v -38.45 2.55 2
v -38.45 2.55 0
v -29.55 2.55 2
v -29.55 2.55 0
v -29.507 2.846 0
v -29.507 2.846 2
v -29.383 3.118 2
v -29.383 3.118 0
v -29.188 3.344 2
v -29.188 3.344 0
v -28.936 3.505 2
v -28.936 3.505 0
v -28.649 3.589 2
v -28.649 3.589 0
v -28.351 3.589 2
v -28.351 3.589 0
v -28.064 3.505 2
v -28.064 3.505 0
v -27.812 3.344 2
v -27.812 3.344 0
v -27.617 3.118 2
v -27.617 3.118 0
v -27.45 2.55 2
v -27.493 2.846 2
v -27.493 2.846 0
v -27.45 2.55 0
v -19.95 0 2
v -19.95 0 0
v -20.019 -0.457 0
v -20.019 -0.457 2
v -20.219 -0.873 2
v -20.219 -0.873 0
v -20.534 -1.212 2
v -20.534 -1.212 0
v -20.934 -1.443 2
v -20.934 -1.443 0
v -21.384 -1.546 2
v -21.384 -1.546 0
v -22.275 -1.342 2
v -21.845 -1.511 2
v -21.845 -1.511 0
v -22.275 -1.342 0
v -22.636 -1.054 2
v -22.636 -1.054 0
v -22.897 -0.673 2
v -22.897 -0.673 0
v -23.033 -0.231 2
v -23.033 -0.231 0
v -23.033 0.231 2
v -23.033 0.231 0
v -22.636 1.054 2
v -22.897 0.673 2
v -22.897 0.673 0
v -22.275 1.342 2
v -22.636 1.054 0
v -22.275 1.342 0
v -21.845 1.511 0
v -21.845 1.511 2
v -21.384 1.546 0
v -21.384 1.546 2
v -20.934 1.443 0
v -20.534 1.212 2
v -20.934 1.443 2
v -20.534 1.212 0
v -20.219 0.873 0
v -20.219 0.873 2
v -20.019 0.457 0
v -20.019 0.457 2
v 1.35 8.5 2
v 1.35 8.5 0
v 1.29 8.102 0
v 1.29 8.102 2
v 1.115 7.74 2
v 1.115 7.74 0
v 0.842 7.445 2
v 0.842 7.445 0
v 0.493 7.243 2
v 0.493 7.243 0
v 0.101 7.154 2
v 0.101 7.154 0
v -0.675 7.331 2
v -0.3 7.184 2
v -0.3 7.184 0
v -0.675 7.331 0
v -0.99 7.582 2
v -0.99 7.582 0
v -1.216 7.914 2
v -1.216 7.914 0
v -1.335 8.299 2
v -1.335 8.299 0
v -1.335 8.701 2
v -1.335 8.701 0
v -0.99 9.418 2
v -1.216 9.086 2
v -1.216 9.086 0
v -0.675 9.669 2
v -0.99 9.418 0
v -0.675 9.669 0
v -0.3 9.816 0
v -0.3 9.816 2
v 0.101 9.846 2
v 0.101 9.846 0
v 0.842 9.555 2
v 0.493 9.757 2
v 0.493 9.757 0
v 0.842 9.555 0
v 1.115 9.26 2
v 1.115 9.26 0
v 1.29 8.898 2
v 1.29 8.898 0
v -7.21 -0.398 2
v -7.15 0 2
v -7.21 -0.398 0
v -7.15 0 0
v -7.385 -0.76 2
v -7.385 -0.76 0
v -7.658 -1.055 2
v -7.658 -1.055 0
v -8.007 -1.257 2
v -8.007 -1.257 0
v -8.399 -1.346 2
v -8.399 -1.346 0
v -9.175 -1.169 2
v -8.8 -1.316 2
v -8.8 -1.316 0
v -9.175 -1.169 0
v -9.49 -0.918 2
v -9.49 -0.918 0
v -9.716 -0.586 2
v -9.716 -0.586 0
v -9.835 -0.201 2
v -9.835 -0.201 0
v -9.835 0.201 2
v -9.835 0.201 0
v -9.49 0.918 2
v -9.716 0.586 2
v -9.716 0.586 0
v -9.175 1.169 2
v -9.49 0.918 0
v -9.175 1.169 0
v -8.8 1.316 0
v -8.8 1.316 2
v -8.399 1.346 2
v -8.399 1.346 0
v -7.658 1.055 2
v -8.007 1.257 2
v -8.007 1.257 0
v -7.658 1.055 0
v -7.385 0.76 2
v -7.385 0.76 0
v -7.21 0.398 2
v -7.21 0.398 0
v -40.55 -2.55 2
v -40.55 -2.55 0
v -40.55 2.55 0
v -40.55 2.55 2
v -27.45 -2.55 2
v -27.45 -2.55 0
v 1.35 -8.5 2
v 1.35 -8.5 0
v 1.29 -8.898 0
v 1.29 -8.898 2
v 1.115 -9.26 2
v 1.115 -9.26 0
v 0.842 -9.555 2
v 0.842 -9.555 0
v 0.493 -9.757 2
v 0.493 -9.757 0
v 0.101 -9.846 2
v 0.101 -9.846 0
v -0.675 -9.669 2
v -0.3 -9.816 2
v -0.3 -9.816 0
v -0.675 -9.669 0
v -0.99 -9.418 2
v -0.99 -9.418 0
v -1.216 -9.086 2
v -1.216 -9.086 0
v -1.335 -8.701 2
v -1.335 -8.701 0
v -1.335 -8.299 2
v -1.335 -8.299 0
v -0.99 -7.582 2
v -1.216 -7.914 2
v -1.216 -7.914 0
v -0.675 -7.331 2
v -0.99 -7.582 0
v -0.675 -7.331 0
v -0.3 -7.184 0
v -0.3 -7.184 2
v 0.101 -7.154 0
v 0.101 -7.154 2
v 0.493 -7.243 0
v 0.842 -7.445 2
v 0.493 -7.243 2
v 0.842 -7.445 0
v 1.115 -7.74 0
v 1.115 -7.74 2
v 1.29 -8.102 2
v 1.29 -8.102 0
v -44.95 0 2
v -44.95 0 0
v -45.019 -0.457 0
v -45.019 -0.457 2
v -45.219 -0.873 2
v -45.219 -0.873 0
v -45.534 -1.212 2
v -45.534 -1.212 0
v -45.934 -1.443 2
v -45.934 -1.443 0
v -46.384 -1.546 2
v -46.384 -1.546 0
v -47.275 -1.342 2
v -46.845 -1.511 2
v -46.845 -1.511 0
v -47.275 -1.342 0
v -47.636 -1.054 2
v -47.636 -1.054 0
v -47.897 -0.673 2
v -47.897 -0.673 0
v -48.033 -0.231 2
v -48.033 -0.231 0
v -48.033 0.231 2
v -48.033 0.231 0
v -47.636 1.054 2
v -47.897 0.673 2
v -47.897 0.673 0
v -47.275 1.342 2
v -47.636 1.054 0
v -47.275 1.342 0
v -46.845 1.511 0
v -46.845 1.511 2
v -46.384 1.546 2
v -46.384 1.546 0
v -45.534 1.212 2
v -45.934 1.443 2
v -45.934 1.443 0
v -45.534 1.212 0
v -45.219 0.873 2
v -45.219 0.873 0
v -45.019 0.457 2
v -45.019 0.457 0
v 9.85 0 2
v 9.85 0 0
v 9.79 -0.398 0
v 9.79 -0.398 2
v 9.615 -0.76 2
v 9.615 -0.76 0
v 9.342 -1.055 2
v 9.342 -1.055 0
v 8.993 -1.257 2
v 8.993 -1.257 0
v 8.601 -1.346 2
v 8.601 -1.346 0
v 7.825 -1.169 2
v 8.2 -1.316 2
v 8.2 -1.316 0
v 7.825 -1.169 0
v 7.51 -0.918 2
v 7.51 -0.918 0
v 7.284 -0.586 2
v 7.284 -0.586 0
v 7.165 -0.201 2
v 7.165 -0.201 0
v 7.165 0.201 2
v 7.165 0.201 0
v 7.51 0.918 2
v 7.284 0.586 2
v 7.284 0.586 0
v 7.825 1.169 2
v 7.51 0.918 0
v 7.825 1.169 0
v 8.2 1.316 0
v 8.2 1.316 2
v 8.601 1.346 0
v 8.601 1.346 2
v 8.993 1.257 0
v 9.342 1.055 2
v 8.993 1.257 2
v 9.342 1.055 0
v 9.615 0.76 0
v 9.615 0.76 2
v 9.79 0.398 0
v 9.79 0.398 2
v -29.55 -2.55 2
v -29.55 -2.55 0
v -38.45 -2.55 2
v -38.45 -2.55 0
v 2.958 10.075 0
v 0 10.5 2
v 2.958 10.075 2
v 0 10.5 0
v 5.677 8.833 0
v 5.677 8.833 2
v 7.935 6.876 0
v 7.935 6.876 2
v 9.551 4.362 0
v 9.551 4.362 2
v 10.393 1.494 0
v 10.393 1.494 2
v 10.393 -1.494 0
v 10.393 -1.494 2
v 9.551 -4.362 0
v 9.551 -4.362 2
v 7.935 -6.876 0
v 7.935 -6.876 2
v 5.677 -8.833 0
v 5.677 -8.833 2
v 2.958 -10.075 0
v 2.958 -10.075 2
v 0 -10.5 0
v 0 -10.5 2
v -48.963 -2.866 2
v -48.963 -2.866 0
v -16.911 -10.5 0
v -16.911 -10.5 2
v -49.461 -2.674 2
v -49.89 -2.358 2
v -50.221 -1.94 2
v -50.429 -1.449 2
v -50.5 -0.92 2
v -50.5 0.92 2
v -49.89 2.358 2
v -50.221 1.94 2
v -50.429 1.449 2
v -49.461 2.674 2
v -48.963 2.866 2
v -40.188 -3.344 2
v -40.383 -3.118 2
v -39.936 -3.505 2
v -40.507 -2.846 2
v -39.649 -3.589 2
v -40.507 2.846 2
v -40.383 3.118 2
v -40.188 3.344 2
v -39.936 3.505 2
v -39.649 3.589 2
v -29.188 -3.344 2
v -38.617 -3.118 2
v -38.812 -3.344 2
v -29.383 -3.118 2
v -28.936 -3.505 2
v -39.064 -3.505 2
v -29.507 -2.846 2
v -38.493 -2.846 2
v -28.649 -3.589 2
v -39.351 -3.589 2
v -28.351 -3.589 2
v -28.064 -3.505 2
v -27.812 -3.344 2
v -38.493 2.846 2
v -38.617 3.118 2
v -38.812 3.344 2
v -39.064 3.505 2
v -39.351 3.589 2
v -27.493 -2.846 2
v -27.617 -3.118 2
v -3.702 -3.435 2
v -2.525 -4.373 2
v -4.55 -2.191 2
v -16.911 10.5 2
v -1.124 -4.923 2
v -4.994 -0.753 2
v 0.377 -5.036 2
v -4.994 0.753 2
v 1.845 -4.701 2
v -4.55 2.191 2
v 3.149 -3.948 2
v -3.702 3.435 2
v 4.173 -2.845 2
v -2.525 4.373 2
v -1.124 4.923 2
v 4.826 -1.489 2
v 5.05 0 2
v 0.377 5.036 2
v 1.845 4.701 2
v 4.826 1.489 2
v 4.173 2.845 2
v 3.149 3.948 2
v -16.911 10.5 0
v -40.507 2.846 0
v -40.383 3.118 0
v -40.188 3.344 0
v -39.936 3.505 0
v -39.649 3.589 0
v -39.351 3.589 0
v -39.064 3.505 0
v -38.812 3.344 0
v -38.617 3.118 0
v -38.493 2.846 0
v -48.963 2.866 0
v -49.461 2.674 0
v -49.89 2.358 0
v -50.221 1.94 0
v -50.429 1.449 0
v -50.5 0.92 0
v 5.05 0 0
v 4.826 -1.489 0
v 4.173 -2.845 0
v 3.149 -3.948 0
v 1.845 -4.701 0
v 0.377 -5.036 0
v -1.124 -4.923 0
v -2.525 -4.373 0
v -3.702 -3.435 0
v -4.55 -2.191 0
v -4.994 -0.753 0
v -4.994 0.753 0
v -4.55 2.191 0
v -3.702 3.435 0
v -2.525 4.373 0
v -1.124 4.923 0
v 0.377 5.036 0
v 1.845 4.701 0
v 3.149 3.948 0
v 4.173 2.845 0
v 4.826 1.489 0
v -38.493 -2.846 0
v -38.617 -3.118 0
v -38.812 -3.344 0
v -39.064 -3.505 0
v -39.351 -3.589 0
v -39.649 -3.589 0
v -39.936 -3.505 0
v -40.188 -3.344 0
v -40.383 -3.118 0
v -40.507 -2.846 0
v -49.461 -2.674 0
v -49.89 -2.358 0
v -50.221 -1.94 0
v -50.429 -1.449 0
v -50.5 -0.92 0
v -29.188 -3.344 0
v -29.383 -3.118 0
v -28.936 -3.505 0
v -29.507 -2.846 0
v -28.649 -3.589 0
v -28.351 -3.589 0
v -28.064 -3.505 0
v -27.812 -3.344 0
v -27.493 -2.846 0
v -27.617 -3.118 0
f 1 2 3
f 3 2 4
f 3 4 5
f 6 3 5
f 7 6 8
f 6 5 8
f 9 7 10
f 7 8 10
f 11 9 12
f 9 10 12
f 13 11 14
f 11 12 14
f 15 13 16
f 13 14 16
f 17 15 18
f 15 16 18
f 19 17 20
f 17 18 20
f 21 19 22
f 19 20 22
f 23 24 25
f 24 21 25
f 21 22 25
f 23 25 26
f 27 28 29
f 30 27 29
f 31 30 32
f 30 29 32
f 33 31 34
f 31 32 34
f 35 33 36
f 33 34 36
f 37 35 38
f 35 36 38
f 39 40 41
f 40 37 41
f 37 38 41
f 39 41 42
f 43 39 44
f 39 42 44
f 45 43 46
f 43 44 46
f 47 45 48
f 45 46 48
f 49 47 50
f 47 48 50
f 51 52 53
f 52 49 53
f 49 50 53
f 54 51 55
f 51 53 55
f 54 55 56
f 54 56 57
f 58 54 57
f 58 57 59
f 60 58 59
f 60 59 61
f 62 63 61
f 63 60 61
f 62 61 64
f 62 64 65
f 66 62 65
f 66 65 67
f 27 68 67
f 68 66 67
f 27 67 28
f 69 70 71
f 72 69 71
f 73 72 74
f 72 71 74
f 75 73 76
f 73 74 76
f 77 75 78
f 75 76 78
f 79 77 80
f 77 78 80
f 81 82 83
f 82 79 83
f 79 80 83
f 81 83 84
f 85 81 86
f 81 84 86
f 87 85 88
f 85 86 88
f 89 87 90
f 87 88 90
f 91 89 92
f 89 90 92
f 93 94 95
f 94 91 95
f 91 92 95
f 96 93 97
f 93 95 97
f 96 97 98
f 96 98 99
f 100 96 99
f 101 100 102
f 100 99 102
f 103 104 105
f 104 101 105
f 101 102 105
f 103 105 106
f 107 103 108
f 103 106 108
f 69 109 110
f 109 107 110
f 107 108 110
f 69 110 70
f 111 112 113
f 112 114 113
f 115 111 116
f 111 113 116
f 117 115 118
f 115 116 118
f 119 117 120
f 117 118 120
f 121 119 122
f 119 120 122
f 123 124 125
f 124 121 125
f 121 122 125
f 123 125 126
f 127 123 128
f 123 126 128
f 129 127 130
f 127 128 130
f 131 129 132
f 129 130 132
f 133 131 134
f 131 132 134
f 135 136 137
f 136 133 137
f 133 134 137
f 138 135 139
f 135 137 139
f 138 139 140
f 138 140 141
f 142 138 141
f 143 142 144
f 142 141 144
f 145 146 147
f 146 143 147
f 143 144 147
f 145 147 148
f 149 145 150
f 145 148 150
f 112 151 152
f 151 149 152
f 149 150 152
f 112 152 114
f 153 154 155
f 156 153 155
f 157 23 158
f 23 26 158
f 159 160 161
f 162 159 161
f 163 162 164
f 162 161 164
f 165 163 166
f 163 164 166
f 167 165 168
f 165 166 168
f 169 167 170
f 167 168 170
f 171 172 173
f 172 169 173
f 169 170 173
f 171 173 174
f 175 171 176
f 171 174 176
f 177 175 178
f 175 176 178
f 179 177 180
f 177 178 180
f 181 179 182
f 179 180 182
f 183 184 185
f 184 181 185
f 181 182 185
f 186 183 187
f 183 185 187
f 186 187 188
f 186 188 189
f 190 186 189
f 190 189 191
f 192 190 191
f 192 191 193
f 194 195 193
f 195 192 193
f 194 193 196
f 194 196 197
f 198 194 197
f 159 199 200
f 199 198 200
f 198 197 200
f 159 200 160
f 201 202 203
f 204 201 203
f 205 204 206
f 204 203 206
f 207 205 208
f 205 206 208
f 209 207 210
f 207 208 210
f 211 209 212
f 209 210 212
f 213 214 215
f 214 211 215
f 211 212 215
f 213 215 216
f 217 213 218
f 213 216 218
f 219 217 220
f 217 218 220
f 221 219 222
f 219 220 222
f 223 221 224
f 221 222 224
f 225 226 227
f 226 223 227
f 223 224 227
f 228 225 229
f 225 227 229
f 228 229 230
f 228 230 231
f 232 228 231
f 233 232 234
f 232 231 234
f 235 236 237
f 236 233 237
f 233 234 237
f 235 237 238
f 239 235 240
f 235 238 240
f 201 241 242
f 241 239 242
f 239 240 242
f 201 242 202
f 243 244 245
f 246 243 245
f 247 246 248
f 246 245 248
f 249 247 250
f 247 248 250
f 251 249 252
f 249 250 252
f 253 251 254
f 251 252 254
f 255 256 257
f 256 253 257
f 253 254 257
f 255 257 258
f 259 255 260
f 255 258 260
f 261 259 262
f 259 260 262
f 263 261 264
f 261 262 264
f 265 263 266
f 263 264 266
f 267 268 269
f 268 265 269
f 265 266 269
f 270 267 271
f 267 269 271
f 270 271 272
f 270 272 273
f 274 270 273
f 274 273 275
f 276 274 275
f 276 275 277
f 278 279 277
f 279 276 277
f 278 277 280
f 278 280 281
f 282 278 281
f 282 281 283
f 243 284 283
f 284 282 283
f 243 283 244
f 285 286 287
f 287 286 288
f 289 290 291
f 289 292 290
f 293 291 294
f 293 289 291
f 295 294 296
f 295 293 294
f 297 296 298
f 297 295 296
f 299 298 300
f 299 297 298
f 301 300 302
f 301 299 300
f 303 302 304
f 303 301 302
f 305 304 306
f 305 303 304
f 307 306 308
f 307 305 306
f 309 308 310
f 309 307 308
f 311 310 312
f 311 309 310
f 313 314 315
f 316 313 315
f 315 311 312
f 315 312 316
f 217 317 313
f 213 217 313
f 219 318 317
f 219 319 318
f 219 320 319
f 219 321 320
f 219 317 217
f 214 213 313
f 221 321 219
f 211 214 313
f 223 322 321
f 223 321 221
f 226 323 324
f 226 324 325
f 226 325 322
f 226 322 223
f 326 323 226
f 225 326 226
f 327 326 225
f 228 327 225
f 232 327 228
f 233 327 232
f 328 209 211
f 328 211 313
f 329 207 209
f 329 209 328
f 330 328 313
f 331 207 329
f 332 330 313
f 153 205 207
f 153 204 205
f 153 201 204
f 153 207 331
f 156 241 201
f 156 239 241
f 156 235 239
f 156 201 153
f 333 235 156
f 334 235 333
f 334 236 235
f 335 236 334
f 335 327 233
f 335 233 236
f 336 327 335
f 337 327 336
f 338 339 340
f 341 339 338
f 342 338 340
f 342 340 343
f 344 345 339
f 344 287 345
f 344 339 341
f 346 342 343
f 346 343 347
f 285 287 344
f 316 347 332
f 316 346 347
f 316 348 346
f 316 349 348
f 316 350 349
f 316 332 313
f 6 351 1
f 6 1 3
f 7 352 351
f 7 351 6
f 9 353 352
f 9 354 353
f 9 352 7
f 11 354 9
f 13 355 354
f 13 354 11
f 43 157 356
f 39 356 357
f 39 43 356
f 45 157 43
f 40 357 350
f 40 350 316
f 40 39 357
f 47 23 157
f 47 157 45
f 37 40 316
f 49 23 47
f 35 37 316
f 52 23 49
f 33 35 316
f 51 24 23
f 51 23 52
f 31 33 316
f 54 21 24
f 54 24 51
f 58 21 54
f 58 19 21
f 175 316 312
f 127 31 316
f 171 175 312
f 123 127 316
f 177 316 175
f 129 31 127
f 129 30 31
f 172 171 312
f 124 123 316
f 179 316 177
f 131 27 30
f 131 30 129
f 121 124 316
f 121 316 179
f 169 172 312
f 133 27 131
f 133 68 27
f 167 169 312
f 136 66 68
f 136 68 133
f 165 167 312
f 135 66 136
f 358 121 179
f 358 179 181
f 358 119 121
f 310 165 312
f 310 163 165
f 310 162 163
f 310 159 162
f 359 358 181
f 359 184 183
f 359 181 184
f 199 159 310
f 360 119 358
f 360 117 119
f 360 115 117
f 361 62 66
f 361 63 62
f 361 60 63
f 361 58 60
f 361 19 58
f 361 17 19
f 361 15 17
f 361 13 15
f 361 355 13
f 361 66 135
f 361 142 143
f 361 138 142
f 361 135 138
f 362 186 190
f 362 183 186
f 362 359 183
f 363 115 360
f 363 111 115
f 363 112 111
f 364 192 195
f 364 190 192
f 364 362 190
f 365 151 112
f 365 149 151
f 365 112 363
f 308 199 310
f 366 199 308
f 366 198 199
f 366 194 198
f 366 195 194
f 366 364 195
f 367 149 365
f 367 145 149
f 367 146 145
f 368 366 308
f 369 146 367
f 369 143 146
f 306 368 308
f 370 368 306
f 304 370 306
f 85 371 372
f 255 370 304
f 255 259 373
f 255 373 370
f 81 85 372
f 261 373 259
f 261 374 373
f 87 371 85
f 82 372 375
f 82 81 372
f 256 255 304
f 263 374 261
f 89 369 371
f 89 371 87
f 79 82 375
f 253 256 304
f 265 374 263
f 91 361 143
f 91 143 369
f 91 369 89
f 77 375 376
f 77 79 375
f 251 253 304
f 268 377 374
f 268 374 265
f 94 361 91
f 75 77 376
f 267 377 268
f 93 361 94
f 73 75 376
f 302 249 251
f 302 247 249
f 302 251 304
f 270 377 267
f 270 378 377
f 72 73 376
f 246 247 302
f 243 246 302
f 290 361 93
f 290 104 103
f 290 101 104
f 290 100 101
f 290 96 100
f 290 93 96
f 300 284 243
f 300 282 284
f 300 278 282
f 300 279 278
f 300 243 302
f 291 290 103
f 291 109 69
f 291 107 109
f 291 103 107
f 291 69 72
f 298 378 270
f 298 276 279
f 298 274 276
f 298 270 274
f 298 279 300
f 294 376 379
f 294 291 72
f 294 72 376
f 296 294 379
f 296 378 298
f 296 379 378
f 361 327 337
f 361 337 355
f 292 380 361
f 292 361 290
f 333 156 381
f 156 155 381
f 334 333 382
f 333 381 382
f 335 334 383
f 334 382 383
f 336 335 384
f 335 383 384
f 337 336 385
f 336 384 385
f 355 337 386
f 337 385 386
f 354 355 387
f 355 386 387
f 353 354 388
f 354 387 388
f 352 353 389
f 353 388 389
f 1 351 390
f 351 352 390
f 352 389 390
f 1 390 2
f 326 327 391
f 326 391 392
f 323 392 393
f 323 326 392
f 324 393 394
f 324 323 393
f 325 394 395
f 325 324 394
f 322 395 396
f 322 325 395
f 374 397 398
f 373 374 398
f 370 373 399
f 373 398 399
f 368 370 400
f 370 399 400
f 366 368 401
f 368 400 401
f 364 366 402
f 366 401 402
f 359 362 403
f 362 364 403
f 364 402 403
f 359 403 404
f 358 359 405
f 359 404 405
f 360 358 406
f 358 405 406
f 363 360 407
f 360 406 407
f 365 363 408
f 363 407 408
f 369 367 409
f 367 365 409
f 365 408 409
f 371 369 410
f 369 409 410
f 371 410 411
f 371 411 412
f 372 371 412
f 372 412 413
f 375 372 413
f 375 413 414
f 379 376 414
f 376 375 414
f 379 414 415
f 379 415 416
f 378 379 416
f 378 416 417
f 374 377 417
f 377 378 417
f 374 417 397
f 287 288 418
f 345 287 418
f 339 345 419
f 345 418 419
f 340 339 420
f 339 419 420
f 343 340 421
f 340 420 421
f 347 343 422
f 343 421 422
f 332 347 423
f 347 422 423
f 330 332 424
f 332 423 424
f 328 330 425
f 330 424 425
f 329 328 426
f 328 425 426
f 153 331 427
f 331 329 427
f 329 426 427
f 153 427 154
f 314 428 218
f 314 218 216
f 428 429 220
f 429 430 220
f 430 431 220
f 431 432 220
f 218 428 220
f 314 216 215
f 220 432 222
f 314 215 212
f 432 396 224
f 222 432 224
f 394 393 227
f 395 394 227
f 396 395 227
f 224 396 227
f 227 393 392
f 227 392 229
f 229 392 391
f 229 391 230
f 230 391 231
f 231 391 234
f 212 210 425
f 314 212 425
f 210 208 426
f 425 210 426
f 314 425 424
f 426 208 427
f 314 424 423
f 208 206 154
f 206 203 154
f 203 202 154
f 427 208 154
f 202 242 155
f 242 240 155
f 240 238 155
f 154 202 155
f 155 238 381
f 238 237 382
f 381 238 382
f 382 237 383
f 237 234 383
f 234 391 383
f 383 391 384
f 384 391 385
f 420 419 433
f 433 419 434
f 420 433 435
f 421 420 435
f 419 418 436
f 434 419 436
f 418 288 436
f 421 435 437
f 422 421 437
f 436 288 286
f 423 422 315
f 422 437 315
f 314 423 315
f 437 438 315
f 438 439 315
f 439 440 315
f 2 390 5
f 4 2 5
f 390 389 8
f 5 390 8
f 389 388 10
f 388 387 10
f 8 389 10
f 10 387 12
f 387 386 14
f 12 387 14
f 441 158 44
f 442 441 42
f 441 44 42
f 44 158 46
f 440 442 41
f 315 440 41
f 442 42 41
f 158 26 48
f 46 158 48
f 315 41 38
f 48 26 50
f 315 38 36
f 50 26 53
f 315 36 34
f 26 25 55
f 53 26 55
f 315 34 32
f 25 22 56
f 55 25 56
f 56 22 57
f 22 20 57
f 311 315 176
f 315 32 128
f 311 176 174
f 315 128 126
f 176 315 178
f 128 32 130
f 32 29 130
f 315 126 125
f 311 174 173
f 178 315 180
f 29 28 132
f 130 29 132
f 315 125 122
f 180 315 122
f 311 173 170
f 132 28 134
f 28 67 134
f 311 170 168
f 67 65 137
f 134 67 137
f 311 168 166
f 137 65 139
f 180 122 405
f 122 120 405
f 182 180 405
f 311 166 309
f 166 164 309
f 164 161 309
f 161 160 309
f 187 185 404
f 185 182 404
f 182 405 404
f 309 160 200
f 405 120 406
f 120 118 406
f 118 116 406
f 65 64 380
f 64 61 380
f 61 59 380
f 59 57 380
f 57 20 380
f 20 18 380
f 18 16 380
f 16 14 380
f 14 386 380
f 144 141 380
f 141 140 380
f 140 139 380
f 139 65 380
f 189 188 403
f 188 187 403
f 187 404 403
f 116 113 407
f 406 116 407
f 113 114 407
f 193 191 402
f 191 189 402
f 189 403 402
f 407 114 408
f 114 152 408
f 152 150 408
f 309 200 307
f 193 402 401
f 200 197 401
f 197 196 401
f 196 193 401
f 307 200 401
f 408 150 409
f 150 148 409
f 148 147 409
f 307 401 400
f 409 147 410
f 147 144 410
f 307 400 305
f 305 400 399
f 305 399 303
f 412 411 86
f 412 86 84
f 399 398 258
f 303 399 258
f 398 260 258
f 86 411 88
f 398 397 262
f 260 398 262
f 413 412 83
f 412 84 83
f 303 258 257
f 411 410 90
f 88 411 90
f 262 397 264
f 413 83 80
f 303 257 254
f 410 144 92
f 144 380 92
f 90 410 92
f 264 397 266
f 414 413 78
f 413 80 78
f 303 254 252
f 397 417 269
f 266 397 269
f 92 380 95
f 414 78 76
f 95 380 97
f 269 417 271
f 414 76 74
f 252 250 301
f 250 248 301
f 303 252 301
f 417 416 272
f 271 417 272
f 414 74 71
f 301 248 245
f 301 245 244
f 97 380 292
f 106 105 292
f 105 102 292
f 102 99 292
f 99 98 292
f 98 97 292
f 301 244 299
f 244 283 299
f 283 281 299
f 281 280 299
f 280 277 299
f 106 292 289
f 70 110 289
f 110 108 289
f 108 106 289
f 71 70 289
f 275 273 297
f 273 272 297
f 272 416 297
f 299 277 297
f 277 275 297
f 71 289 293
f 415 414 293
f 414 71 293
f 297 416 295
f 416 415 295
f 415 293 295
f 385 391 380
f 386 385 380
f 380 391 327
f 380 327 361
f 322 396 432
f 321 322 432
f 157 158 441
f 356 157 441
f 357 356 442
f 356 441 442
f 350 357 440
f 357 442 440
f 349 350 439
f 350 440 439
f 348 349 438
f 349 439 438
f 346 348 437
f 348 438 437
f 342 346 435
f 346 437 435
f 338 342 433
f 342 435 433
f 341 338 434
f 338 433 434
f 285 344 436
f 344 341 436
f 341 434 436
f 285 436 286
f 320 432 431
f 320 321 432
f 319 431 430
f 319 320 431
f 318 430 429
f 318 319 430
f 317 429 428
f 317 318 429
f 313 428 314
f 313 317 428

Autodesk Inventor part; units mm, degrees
ref_plane "YZ Plane" through (0, 0, 0) normal (1, 0, 0) x (0, 1, 0)
ref_plane "XZ Plane" through (0, 0, 0) normal (0, 1, 0) x (-1, 0, 0)
ref_plane "XY Plane" through (0, 0, 0) normal (0, 0, 1) x (1, 0, 0)
sketch "スケッチ1" plane through (0, 0, 0) normal (0, 0, 1) x (1, 0, 0)
  circle A0 centre (0, 0) radius 10.5 construction
  line L0 (0, 10.5) -> (-162.5, 10.5) construction
  line L1 (-162.5, 10.5) -> (-162.5, -10.5) construction
  line L2 (-162.5, -10.5) -> (0, -10.5) construction
  circle A1 centre (-157.5, 0) radius 1.55 construction
  line L3 (-147.5, 2.5) -> (-32.5, 2.5) construction
  line L4 (-32.5, 2.5) -> (-32.5, -2.5) construction
  line L5 (-32.5, -2.5) -> (-147.5, -2.5) construction
  line L6 (-147.5, -2.5) -> (-147.5, 2.5) construction
  line L7 (-90, 2.5) -> (-90, -2.5) construction
  circle A2 centre (-22.5, 0) radius 1.55 construction
  line L8 (-12, 21.3027) -> (-12, -27.3903) construction
  line L9 (-32.45, 2.55) -> (-147.55, 2.55) construction
  line L10 (-147.55, 2.55) -> (-147.55, -2.55) construction
  line L11 (-147.55, -2.55) -> (-32.45, -2.55) construction
  line L12 (-32.45, -2.55) -> (-32.45, 2.55) construction
  circle A3 centre (-146.5, 2.55) radius 1.05 construction
  line L13 (-147.5, 0) -> (-90, 0) construction
  line L14 (-147.55, 2.55) -> (-147.55, -2.55) construction
  arc A4 (-145.45, 2.55) -> (-147.55, 2.55) centre (-146.5, 2.55) ccw construction
  line L15 (-145.45, 2.55) -> (-34.55, 2.55) construction
  arc A5 (-32.45, 2.55) -> (-34.55, 2.55) centre (-33.5, 2.55) ccw construction
  line L16 (-32.45, 2.55) -> (-32.45, -2.55) construction
  arc A6 (-147.55, -2.55) -> (-145.45, -2.55) centre (-146.5, -2.55) ccw construction
  line L17 (-145.45, -2.55) -> (-34.55, -2.55) construction
  arc A7 (-34.55, -2.55) -> (-32.45, -2.55) centre (-33.5, -2.55) ccw construction
  circle A8 centre (0, 8.5) radius 1.35
  circle A9 centre (0, 0) radius 5.05
  circle A10 centre (-8.5, 0) radius 1.35
  circle A11 centre (0, -8.5) radius 1.35
  circle A12 centre (8.5, 0) radius 1.35
  line L18 (-162.5, 4.8006) -> (-162.5, -4.8006) construction
  line L19 (-162.5, 4.8006) -> (-22.5, 10.5) construction
  line L20 (-22.5, 10.5) -> (0, 10.5) construction
  line L21 (-162.5, -4.8006) -> (-22.5, -10.5) construction
  line L22 (-22.5, -10.5) -> (0, -10.5) construction
  arc A13 (0, -10.5) -> (0, 10.5) centre (0, 0) ccw construction
  circle A14 centre (-157.5, 0) radius 5 construction
  circle A15 centre (-21.5, 0) radius 1.55
  circle A16 centre (-46.5, 0) radius 1.55
  line L23 (-17.5, -2.5) -> (-50.5, -2.5) construction
  line L24 (-50.5, -2.5) -> (-50.5, 2.5) construction
  line L25 (-50.5, 2.5) -> (-17.5, 2.5) construction
  line L26 (-17.5, 2.5) -> (-17.5, -2.5) construction
  line L27 (-27.5, -2.5) -> (-40.5, -2.5) construction
  line L28 (-40.5, -2.5) -> (-40.5, 2.5) construction
  line L29 (-40.5, 2.5) -> (-27.5, 2.5) construction
  line L30 (-27.5, 2.5) -> (-27.5, -2.5) construction
  line L31 (-27.45, -2.55) -> (-40.55, -2.55)
  line L32 (-40.55, -2.55) -> (-40.55, 2.55)
  line L33 (-40.55, 2.55) -> (-27.45, 2.55)
  line L34 (-27.45, 2.55) -> (-27.45, -2.55)
  circle A17 centre (-28.5, -2.55) radius 1.05
  circle A18 centre (-28.5, 2.55) radius 1.05
  circle A19 centre (-39.5, -2.55) radius 1.05
  circle A20 centre (-39.5, 2.55) radius 1.05
  line L35 (-50.5, 2.5) -> (-50.5, -2.5)
  line L36 (-50.5, -2.5) -> (-16.9113, -10.5)
  line L37 (-50.5, 2.5) -> (-16.9113, 10.5)
  arc A21 (0, -10.5) -> (0, 10.5) centre (0, 0) ccw
  line L38 (-16.9113, 10.5) -> (0, 10.5)
  line L39 (0, -10.5) -> (-16.9113, -10.5)
  circle A22 centre (-39.5, 2.55) radius 2.5 construction
  circle A23 centre (0, 0) radius 16 construction
  circle A24 centre (0, 0) radius 21 construction
  line L40 (-21, 19.3585) -> (-21, -28.09) construction
  point P0 (-162.5, 0)
  point P1 (-17.5, 0)
  dimension "d9" = 2.1
  dimension "d29" = 2.1
  dimension "d0" = 162.5
  dimension "d1" = 3.1
  dimension "d2" = 21
  dimension "d3" = 10
  dimension "d4" = 5
  dimension "d5" = 12
  dimension "d6" = 135
  dimension "d7" = 5
  dimension "d8" = 0.05
  dimension "d10" = 2.7
  dimension "d11" = 8.5
  dimension "d12" = 10.1
  dimension "d15" = 360
  dimension "d20" = 3.1
  dimension "d21" = 5
  dimension "d22" = 4
  dimension "d23" = 5
  dimension "d24" = 25
  dimension "d26" = 10
  dimension "d27" = 4
  dimension "d28" = 10
  dimension "d30" = 0.05
  dimension "d32" = 5
  dimension "d33" = 32
  dimension "d34" = 5
extrude "押し出し1" add sketch "スケッチ1" along normal blind 2
fillet "フィレット2" radius 2 2 edges at (-50.5, 2.5, 1) (-50.5, -2.5, 1)
equation "\"d0\" = d0_1"
equation "\"d2\" = d2_1"
equation "\"d3\" = d3_1"
equation "\"d4\" = d4_1"
equation "\"d6\" = d6_1"
equation "\"d21\" = d4"
equation "\"d27\" = d22"
equation "\"d28\" = d26"
equation "\"d2_1\" = 21"
equation "\"d3_1\" = 10"
equation "\"d4_1\" = 5"
equation "\"d6_1\" = 135"
equation "\"d0_1\" = 162.5"
properties part number "前腕_メインフレーム_1_1" material "GFRP"
